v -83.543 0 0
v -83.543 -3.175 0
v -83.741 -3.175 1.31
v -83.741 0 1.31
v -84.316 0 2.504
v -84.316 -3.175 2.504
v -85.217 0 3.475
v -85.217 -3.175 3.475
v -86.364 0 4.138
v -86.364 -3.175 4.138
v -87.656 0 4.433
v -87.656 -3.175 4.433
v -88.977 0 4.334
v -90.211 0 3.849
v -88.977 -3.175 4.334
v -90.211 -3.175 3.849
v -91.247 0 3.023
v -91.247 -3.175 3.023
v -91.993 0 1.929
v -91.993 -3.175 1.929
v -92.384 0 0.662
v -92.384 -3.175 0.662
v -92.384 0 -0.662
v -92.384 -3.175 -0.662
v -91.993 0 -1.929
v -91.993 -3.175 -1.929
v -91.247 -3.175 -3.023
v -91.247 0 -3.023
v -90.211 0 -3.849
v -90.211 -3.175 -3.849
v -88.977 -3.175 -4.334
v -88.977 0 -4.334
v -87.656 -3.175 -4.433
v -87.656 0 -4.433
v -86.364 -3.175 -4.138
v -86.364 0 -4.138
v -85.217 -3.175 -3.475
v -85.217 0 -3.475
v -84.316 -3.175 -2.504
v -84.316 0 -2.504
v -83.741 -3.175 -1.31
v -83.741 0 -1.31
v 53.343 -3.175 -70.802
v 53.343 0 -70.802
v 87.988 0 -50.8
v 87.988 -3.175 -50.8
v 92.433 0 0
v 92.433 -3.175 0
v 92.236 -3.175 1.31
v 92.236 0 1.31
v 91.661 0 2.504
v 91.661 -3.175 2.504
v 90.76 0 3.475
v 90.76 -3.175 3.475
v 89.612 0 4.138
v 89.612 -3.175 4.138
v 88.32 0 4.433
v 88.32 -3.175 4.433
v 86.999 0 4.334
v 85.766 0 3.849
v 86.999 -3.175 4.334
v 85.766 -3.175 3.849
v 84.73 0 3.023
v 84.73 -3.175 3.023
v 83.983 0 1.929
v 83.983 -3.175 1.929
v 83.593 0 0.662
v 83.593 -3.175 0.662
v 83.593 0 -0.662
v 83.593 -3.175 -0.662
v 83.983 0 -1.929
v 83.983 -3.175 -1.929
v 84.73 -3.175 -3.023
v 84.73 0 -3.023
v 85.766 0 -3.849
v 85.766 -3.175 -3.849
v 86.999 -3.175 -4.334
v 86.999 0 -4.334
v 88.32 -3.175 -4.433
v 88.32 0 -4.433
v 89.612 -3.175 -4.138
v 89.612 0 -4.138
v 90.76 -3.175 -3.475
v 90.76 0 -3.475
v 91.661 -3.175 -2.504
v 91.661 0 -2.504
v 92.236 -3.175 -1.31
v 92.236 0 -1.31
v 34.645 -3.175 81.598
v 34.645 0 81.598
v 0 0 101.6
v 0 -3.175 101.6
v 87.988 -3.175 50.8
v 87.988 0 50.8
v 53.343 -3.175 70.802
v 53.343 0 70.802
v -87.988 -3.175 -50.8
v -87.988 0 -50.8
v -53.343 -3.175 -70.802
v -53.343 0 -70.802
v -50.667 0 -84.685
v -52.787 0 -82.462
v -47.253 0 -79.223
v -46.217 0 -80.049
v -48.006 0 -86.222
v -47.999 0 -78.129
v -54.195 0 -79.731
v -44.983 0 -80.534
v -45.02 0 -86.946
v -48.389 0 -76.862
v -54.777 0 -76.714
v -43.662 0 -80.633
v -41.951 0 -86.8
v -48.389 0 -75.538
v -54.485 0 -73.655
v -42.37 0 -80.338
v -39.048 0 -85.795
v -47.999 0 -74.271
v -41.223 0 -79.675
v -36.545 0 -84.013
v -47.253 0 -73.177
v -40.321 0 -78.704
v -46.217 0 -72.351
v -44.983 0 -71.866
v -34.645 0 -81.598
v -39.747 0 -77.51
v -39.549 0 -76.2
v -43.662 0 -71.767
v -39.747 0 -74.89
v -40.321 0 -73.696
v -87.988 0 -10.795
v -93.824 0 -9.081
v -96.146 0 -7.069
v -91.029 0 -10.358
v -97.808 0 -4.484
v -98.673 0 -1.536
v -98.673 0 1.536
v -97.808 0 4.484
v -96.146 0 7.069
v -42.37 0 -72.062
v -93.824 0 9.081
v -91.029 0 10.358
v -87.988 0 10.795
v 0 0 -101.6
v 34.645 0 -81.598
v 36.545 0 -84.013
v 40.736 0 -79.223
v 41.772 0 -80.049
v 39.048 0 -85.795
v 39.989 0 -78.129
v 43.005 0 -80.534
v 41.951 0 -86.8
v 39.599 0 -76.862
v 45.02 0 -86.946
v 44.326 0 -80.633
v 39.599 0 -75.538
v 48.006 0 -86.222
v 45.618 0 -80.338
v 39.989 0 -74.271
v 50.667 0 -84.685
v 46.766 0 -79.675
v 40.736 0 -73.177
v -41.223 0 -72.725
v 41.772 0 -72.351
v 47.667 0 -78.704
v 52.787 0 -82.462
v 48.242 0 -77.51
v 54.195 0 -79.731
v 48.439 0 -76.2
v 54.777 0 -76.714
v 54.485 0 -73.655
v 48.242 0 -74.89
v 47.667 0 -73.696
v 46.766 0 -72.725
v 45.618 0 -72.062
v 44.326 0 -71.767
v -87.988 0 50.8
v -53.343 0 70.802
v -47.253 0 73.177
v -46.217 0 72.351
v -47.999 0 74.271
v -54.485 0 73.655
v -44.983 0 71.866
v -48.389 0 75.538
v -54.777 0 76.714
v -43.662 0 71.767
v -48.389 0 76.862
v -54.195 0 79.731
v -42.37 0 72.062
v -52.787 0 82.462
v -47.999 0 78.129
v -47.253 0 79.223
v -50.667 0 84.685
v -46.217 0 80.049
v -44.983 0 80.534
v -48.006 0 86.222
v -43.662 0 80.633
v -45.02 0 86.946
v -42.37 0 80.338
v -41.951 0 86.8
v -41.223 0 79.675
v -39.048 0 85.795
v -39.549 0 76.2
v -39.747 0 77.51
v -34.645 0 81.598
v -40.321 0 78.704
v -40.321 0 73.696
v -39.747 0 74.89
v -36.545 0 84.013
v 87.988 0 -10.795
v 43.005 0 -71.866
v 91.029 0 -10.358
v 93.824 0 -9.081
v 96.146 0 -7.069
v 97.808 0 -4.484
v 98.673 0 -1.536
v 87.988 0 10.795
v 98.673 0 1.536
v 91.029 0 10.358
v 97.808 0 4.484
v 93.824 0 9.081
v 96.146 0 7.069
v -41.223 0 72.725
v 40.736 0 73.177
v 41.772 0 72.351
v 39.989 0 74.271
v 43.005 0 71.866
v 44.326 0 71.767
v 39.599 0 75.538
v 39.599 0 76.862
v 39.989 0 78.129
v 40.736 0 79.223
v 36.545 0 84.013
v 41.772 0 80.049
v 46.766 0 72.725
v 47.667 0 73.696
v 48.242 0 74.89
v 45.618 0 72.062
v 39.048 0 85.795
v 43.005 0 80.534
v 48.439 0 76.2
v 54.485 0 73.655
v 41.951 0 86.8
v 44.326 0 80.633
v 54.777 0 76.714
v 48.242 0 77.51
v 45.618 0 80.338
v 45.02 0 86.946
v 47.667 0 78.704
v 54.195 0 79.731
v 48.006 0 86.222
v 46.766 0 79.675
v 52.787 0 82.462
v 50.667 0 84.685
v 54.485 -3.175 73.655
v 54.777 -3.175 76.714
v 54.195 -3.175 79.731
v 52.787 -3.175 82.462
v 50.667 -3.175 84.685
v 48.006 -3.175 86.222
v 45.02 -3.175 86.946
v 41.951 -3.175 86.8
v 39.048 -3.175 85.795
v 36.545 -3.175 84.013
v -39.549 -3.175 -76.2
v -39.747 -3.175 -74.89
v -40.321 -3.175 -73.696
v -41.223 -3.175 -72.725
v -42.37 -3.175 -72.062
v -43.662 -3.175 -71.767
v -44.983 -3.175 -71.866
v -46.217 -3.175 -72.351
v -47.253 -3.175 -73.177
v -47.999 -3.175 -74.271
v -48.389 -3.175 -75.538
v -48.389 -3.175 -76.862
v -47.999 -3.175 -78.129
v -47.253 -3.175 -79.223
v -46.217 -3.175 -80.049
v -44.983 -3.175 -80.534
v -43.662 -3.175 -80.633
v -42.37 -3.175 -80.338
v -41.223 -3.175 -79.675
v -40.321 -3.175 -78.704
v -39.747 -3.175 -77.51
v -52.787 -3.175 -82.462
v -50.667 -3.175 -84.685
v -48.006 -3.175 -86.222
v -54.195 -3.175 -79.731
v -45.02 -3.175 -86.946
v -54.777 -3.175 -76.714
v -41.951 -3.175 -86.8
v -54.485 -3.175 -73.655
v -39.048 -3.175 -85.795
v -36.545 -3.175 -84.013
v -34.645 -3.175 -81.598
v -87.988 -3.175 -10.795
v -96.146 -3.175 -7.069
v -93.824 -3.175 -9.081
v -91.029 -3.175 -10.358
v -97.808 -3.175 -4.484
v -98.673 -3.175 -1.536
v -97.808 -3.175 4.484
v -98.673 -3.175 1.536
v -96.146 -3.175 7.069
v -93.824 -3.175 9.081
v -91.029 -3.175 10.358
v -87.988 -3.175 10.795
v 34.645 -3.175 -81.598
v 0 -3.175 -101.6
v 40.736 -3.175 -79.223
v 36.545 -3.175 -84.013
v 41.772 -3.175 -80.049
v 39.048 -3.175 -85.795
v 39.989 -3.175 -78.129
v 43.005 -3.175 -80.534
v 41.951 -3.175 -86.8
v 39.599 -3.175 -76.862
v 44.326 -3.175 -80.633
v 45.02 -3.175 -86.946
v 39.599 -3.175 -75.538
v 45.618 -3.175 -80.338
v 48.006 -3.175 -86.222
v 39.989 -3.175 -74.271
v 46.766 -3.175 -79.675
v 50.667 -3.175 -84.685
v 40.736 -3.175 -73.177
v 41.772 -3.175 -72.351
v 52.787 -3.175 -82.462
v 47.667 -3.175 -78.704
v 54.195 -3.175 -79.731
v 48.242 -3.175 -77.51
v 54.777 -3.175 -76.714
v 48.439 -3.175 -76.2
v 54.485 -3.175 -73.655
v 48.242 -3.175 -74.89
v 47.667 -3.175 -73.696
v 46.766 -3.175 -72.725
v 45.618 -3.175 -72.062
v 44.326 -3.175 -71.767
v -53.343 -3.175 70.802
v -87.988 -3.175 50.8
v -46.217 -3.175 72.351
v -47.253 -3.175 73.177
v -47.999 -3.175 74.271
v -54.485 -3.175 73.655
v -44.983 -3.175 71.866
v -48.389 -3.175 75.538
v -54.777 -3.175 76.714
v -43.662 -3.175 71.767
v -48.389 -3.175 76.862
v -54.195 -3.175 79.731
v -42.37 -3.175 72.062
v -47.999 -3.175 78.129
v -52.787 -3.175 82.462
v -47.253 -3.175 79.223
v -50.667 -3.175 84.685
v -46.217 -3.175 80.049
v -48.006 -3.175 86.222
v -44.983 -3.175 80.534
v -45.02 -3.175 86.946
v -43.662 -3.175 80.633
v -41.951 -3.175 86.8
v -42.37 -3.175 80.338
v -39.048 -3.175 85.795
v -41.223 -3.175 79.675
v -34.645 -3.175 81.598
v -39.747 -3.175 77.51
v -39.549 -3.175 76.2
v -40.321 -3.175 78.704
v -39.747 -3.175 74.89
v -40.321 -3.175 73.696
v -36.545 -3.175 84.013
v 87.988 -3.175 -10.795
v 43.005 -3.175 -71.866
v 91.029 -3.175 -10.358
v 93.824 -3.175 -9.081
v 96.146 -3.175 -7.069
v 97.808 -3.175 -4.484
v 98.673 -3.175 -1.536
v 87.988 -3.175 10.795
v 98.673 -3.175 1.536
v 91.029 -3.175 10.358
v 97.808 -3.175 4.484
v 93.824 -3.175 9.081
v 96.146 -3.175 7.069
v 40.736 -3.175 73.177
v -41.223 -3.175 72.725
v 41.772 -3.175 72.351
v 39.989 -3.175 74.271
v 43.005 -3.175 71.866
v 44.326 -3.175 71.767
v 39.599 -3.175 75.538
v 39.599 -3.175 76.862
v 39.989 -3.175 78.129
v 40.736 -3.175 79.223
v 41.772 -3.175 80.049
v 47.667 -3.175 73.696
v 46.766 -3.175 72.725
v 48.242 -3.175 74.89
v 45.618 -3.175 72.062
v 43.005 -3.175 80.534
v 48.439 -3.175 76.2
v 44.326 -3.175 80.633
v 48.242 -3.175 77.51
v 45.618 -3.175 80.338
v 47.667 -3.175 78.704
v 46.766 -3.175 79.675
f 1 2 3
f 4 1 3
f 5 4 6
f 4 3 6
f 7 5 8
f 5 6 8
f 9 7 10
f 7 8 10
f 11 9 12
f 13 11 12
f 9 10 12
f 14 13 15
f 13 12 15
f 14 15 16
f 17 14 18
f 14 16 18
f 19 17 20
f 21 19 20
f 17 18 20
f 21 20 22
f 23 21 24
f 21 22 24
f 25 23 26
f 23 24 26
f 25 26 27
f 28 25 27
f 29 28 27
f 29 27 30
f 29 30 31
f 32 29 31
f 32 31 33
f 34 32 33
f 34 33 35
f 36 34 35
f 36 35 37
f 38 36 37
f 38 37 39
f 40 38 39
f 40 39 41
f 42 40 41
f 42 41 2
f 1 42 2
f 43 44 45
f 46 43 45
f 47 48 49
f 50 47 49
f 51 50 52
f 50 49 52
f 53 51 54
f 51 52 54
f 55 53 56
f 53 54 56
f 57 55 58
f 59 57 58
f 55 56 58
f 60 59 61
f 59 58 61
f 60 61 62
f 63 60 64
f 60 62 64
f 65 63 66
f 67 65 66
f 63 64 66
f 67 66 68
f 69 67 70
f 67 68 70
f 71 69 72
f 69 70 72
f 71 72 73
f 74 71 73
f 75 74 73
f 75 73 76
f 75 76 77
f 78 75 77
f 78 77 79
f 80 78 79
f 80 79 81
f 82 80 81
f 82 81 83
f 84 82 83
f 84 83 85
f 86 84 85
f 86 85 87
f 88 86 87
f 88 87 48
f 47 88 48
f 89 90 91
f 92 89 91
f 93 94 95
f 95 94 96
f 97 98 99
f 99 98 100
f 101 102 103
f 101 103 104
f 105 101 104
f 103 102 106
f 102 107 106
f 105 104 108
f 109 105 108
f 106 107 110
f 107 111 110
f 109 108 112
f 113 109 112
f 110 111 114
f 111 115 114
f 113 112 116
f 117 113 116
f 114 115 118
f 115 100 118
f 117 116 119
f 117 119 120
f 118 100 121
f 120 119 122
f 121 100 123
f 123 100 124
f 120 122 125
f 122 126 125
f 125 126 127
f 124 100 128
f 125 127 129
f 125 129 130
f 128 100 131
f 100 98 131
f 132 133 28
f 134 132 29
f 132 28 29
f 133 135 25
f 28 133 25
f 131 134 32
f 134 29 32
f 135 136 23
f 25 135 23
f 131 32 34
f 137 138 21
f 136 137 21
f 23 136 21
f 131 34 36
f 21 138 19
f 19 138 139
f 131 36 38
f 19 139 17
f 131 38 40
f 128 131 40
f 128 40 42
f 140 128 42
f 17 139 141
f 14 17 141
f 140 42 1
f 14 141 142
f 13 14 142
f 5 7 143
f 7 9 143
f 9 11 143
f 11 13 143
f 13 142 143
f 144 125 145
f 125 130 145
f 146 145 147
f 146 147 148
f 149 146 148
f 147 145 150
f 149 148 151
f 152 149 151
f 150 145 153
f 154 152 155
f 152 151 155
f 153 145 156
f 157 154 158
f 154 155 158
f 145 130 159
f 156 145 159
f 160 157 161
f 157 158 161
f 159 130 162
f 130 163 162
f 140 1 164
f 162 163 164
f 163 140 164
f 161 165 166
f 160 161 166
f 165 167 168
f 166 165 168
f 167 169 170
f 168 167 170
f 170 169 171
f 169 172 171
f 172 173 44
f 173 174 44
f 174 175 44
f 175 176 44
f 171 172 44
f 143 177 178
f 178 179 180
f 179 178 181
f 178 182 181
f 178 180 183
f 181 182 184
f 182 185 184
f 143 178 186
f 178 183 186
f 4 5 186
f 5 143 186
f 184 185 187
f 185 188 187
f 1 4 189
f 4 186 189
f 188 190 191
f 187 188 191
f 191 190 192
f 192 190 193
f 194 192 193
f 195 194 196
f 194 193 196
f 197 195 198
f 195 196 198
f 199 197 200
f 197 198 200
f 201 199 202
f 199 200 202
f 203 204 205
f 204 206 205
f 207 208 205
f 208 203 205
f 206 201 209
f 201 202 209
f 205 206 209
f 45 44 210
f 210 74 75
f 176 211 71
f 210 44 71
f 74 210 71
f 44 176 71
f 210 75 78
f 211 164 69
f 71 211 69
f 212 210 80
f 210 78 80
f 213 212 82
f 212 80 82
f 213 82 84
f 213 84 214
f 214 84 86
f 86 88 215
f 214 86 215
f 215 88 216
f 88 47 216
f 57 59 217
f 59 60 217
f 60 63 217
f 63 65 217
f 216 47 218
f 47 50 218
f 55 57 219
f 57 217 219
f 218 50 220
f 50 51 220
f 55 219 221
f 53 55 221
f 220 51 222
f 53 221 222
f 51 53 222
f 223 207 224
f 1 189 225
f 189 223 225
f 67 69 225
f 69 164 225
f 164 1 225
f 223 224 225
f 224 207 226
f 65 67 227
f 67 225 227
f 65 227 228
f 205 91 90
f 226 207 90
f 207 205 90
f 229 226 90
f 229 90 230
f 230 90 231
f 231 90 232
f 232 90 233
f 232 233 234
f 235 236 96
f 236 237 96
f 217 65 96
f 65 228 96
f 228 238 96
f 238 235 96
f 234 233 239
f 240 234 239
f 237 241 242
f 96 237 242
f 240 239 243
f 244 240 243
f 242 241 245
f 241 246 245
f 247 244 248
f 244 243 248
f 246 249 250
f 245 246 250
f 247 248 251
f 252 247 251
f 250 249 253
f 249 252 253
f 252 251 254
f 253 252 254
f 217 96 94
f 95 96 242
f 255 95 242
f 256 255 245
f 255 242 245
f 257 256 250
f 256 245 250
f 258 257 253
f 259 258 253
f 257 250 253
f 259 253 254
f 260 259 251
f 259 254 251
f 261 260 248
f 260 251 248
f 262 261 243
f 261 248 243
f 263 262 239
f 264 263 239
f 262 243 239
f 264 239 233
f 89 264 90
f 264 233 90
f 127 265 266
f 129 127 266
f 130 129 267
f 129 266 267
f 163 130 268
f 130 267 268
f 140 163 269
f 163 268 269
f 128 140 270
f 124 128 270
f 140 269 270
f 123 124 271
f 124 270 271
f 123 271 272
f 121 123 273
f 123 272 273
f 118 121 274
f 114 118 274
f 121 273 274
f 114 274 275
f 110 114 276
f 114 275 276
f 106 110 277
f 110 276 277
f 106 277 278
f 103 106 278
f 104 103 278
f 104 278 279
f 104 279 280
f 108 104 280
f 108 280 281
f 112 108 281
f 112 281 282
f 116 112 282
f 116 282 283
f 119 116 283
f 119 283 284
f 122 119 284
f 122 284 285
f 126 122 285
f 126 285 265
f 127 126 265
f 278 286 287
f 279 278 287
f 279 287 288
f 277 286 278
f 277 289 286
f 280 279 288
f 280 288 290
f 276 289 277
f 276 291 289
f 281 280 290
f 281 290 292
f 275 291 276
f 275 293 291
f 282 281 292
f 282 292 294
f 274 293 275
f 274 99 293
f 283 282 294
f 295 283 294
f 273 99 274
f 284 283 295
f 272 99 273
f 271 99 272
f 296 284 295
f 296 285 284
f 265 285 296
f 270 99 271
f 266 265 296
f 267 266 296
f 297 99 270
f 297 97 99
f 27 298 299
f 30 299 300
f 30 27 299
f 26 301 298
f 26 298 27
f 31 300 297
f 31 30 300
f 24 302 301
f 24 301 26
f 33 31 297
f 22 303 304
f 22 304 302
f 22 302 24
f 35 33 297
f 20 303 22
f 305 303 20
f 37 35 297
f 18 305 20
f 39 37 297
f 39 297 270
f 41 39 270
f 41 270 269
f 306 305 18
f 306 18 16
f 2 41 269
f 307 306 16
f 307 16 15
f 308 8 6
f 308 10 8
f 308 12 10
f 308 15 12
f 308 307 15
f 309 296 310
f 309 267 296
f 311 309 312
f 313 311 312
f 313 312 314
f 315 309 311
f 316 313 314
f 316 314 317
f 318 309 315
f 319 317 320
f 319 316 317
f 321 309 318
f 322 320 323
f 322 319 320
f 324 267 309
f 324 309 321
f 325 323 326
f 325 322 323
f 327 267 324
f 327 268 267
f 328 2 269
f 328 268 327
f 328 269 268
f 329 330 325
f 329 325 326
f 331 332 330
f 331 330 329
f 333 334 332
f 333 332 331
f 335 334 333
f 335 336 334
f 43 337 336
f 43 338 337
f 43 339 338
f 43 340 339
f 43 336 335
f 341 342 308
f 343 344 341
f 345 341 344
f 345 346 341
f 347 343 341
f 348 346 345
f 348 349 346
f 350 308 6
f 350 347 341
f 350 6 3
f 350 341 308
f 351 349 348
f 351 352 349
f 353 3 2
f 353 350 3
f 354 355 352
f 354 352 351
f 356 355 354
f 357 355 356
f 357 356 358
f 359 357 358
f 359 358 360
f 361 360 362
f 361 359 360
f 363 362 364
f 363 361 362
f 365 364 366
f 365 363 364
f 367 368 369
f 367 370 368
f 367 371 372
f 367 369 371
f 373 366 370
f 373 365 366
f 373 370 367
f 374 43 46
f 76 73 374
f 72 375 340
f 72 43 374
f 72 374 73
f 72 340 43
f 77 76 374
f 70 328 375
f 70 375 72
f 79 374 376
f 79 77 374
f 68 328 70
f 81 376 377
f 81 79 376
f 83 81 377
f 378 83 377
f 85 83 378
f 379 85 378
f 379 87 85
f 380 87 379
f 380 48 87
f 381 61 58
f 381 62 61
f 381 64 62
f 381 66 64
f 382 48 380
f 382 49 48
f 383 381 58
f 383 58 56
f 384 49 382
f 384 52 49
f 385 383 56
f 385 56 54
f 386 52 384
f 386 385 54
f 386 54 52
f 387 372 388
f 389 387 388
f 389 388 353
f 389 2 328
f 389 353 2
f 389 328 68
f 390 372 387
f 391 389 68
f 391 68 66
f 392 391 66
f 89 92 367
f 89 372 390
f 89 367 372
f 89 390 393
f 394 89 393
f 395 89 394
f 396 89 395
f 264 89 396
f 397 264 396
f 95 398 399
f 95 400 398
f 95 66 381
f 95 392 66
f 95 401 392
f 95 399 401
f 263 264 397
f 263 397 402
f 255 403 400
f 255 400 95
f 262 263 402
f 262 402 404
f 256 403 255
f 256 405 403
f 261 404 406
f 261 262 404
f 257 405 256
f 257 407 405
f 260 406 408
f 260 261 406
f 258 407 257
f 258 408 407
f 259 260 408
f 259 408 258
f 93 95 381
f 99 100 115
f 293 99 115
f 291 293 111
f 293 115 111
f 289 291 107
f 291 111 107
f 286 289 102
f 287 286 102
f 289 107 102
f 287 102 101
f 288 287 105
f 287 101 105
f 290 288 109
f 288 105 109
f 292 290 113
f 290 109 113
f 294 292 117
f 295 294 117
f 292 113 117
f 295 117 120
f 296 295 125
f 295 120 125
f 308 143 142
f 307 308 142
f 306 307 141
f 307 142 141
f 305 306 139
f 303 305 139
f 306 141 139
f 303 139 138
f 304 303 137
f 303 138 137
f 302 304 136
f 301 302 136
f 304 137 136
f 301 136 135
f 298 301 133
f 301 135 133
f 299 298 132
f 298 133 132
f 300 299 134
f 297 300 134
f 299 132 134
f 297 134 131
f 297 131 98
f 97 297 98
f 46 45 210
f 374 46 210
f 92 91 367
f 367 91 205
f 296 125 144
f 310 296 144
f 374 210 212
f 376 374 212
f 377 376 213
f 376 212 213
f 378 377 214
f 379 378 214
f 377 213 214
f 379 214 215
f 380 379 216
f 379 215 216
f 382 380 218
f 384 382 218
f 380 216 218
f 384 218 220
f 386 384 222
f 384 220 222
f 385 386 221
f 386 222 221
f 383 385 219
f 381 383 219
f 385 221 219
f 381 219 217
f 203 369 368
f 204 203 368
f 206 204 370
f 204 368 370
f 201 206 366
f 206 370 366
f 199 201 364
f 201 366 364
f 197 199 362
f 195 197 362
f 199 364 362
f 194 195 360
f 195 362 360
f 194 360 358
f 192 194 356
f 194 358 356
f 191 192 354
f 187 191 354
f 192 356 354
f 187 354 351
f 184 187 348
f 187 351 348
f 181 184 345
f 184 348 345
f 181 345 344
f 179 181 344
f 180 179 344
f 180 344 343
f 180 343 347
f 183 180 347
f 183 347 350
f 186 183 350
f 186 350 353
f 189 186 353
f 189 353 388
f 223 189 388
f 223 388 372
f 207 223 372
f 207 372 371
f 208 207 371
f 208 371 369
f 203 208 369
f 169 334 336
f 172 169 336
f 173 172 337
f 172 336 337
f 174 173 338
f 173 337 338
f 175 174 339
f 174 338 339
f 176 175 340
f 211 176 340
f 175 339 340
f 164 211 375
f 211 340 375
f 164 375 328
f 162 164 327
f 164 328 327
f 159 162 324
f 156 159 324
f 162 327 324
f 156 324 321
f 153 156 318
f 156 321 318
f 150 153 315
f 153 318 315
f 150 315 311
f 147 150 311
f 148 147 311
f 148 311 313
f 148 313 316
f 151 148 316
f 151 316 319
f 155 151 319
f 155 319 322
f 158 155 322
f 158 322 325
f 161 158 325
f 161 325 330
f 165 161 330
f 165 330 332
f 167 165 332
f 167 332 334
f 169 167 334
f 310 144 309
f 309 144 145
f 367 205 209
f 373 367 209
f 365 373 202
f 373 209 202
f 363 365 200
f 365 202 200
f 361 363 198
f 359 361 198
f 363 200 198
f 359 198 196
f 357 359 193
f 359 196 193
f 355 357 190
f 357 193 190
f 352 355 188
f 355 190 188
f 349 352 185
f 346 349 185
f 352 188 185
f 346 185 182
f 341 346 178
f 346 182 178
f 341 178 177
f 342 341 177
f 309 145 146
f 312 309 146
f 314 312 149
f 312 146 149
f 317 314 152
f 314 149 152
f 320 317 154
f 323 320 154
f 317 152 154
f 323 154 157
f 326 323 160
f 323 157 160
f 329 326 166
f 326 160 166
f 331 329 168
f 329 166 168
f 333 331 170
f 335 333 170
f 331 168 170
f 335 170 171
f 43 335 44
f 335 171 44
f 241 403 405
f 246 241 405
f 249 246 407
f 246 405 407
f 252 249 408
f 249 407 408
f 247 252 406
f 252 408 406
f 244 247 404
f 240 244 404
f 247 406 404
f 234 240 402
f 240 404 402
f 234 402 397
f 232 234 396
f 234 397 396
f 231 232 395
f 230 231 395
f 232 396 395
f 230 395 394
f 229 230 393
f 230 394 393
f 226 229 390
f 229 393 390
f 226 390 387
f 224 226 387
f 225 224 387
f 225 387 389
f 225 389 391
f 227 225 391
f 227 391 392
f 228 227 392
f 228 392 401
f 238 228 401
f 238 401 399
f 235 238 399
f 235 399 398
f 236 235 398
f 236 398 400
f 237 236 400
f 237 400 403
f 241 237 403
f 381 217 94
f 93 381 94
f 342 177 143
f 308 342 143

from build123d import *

# Parameters (mm, degrees)
F1_DEPTH = 3.175
F4_DEPTH = 3.175
F5_R     = 4.445
F6_DEPTH = 3.176


# Not quite as in the source:
# - a length typed as a fraction of an inch, garbled in the dataset ("3 / 203.2 mm" for 3/8 in), is restored


with BuildPart() as f1:
    # F0 (on Front) → F1 (new body)
    with BuildSketch(Plane.XZ):
        Polygon((87.9881810245, 50.8), (0, 101.6), (-87.9881810245, 50.8), (-87.9881810245, -50.8), (0, -101.6), (87.9881810245, -50.8), align=None)
    extrude(amount=F1_DEPTH)

    # F3 (on Front) → F4 (join)
    with BuildSketch(Plane.XZ):
        with BuildLine():
            ThreePointArc((87.9881810245, -10.795), (98.7831810245, 0), (87.9881810245, 10.795))
            Line((87.9881810245, 10.795), (87.9881810245, -10.795))
        make_face()
        with BuildLine():
            Line((34.6453462784, 81.5975), (53.3428347461, 70.8025))
            ThreePointArc((53.3428347461, 70.8025), (49.3915905122, 85.5487442339), (34.6453462784, 81.5975))
        make_face()
        with BuildLine():
            Line((-53.3428347461, 70.8025), (-34.6453462784, 81.5975))
            ThreePointArc((-34.6453462784, 81.5975), (-49.3915905122, 85.5487442339), (-53.3428347461, 70.8025))
        make_face()
        with BuildLine():
            Line((-87.9881810245, -10.795), (-87.9881810245, 10.795))
            ThreePointArc((-87.9881810245, 10.795), (-98.7831810245, 0), (-87.9881810245, -10.795))
        make_face()
        with BuildLine():
            Line((-34.6453462784, -81.5975), (-53.3428347461, -70.8025))
            ThreePointArc((-53.3428347461, -70.8025), (-49.3915905122, -85.5487442339), (-34.6453462784, -81.5975))
        make_face()
        with BuildLine():
            Line((53.3428347461, -70.8025), (34.6453462784, -81.5975))
            ThreePointArc((34.6453462784, -81.5975), (49.3915905122, -85.5487442339), (53.3428347461, -70.8025))
        make_face()
    extrude(amount=F4_DEPTH)

    # F5 (on face) → F6 (cut, through all)
    with BuildSketch(Plane.XZ.offset(3.175)):
        with Locations((43.9940905122, 76.2)):
            Circle(F5_R)
        with Locations((-43.9940905122, 76.2)):
            Circle(F5_R)
        with Locations((-87.9881810245, 0)):
            Circle(F5_R)
        with Locations((-43.9940905122, -76.2)):
            Circle(F5_R)
        with Locations((43.9940905122, -76.2)):
            Circle(F5_R)
        with Locations((87.9881810245, 0)):
            Circle(F5_R)
    extrude(amount=-F6_DEPTH, mode=Mode.SUBTRACT)


solid = f1.part
